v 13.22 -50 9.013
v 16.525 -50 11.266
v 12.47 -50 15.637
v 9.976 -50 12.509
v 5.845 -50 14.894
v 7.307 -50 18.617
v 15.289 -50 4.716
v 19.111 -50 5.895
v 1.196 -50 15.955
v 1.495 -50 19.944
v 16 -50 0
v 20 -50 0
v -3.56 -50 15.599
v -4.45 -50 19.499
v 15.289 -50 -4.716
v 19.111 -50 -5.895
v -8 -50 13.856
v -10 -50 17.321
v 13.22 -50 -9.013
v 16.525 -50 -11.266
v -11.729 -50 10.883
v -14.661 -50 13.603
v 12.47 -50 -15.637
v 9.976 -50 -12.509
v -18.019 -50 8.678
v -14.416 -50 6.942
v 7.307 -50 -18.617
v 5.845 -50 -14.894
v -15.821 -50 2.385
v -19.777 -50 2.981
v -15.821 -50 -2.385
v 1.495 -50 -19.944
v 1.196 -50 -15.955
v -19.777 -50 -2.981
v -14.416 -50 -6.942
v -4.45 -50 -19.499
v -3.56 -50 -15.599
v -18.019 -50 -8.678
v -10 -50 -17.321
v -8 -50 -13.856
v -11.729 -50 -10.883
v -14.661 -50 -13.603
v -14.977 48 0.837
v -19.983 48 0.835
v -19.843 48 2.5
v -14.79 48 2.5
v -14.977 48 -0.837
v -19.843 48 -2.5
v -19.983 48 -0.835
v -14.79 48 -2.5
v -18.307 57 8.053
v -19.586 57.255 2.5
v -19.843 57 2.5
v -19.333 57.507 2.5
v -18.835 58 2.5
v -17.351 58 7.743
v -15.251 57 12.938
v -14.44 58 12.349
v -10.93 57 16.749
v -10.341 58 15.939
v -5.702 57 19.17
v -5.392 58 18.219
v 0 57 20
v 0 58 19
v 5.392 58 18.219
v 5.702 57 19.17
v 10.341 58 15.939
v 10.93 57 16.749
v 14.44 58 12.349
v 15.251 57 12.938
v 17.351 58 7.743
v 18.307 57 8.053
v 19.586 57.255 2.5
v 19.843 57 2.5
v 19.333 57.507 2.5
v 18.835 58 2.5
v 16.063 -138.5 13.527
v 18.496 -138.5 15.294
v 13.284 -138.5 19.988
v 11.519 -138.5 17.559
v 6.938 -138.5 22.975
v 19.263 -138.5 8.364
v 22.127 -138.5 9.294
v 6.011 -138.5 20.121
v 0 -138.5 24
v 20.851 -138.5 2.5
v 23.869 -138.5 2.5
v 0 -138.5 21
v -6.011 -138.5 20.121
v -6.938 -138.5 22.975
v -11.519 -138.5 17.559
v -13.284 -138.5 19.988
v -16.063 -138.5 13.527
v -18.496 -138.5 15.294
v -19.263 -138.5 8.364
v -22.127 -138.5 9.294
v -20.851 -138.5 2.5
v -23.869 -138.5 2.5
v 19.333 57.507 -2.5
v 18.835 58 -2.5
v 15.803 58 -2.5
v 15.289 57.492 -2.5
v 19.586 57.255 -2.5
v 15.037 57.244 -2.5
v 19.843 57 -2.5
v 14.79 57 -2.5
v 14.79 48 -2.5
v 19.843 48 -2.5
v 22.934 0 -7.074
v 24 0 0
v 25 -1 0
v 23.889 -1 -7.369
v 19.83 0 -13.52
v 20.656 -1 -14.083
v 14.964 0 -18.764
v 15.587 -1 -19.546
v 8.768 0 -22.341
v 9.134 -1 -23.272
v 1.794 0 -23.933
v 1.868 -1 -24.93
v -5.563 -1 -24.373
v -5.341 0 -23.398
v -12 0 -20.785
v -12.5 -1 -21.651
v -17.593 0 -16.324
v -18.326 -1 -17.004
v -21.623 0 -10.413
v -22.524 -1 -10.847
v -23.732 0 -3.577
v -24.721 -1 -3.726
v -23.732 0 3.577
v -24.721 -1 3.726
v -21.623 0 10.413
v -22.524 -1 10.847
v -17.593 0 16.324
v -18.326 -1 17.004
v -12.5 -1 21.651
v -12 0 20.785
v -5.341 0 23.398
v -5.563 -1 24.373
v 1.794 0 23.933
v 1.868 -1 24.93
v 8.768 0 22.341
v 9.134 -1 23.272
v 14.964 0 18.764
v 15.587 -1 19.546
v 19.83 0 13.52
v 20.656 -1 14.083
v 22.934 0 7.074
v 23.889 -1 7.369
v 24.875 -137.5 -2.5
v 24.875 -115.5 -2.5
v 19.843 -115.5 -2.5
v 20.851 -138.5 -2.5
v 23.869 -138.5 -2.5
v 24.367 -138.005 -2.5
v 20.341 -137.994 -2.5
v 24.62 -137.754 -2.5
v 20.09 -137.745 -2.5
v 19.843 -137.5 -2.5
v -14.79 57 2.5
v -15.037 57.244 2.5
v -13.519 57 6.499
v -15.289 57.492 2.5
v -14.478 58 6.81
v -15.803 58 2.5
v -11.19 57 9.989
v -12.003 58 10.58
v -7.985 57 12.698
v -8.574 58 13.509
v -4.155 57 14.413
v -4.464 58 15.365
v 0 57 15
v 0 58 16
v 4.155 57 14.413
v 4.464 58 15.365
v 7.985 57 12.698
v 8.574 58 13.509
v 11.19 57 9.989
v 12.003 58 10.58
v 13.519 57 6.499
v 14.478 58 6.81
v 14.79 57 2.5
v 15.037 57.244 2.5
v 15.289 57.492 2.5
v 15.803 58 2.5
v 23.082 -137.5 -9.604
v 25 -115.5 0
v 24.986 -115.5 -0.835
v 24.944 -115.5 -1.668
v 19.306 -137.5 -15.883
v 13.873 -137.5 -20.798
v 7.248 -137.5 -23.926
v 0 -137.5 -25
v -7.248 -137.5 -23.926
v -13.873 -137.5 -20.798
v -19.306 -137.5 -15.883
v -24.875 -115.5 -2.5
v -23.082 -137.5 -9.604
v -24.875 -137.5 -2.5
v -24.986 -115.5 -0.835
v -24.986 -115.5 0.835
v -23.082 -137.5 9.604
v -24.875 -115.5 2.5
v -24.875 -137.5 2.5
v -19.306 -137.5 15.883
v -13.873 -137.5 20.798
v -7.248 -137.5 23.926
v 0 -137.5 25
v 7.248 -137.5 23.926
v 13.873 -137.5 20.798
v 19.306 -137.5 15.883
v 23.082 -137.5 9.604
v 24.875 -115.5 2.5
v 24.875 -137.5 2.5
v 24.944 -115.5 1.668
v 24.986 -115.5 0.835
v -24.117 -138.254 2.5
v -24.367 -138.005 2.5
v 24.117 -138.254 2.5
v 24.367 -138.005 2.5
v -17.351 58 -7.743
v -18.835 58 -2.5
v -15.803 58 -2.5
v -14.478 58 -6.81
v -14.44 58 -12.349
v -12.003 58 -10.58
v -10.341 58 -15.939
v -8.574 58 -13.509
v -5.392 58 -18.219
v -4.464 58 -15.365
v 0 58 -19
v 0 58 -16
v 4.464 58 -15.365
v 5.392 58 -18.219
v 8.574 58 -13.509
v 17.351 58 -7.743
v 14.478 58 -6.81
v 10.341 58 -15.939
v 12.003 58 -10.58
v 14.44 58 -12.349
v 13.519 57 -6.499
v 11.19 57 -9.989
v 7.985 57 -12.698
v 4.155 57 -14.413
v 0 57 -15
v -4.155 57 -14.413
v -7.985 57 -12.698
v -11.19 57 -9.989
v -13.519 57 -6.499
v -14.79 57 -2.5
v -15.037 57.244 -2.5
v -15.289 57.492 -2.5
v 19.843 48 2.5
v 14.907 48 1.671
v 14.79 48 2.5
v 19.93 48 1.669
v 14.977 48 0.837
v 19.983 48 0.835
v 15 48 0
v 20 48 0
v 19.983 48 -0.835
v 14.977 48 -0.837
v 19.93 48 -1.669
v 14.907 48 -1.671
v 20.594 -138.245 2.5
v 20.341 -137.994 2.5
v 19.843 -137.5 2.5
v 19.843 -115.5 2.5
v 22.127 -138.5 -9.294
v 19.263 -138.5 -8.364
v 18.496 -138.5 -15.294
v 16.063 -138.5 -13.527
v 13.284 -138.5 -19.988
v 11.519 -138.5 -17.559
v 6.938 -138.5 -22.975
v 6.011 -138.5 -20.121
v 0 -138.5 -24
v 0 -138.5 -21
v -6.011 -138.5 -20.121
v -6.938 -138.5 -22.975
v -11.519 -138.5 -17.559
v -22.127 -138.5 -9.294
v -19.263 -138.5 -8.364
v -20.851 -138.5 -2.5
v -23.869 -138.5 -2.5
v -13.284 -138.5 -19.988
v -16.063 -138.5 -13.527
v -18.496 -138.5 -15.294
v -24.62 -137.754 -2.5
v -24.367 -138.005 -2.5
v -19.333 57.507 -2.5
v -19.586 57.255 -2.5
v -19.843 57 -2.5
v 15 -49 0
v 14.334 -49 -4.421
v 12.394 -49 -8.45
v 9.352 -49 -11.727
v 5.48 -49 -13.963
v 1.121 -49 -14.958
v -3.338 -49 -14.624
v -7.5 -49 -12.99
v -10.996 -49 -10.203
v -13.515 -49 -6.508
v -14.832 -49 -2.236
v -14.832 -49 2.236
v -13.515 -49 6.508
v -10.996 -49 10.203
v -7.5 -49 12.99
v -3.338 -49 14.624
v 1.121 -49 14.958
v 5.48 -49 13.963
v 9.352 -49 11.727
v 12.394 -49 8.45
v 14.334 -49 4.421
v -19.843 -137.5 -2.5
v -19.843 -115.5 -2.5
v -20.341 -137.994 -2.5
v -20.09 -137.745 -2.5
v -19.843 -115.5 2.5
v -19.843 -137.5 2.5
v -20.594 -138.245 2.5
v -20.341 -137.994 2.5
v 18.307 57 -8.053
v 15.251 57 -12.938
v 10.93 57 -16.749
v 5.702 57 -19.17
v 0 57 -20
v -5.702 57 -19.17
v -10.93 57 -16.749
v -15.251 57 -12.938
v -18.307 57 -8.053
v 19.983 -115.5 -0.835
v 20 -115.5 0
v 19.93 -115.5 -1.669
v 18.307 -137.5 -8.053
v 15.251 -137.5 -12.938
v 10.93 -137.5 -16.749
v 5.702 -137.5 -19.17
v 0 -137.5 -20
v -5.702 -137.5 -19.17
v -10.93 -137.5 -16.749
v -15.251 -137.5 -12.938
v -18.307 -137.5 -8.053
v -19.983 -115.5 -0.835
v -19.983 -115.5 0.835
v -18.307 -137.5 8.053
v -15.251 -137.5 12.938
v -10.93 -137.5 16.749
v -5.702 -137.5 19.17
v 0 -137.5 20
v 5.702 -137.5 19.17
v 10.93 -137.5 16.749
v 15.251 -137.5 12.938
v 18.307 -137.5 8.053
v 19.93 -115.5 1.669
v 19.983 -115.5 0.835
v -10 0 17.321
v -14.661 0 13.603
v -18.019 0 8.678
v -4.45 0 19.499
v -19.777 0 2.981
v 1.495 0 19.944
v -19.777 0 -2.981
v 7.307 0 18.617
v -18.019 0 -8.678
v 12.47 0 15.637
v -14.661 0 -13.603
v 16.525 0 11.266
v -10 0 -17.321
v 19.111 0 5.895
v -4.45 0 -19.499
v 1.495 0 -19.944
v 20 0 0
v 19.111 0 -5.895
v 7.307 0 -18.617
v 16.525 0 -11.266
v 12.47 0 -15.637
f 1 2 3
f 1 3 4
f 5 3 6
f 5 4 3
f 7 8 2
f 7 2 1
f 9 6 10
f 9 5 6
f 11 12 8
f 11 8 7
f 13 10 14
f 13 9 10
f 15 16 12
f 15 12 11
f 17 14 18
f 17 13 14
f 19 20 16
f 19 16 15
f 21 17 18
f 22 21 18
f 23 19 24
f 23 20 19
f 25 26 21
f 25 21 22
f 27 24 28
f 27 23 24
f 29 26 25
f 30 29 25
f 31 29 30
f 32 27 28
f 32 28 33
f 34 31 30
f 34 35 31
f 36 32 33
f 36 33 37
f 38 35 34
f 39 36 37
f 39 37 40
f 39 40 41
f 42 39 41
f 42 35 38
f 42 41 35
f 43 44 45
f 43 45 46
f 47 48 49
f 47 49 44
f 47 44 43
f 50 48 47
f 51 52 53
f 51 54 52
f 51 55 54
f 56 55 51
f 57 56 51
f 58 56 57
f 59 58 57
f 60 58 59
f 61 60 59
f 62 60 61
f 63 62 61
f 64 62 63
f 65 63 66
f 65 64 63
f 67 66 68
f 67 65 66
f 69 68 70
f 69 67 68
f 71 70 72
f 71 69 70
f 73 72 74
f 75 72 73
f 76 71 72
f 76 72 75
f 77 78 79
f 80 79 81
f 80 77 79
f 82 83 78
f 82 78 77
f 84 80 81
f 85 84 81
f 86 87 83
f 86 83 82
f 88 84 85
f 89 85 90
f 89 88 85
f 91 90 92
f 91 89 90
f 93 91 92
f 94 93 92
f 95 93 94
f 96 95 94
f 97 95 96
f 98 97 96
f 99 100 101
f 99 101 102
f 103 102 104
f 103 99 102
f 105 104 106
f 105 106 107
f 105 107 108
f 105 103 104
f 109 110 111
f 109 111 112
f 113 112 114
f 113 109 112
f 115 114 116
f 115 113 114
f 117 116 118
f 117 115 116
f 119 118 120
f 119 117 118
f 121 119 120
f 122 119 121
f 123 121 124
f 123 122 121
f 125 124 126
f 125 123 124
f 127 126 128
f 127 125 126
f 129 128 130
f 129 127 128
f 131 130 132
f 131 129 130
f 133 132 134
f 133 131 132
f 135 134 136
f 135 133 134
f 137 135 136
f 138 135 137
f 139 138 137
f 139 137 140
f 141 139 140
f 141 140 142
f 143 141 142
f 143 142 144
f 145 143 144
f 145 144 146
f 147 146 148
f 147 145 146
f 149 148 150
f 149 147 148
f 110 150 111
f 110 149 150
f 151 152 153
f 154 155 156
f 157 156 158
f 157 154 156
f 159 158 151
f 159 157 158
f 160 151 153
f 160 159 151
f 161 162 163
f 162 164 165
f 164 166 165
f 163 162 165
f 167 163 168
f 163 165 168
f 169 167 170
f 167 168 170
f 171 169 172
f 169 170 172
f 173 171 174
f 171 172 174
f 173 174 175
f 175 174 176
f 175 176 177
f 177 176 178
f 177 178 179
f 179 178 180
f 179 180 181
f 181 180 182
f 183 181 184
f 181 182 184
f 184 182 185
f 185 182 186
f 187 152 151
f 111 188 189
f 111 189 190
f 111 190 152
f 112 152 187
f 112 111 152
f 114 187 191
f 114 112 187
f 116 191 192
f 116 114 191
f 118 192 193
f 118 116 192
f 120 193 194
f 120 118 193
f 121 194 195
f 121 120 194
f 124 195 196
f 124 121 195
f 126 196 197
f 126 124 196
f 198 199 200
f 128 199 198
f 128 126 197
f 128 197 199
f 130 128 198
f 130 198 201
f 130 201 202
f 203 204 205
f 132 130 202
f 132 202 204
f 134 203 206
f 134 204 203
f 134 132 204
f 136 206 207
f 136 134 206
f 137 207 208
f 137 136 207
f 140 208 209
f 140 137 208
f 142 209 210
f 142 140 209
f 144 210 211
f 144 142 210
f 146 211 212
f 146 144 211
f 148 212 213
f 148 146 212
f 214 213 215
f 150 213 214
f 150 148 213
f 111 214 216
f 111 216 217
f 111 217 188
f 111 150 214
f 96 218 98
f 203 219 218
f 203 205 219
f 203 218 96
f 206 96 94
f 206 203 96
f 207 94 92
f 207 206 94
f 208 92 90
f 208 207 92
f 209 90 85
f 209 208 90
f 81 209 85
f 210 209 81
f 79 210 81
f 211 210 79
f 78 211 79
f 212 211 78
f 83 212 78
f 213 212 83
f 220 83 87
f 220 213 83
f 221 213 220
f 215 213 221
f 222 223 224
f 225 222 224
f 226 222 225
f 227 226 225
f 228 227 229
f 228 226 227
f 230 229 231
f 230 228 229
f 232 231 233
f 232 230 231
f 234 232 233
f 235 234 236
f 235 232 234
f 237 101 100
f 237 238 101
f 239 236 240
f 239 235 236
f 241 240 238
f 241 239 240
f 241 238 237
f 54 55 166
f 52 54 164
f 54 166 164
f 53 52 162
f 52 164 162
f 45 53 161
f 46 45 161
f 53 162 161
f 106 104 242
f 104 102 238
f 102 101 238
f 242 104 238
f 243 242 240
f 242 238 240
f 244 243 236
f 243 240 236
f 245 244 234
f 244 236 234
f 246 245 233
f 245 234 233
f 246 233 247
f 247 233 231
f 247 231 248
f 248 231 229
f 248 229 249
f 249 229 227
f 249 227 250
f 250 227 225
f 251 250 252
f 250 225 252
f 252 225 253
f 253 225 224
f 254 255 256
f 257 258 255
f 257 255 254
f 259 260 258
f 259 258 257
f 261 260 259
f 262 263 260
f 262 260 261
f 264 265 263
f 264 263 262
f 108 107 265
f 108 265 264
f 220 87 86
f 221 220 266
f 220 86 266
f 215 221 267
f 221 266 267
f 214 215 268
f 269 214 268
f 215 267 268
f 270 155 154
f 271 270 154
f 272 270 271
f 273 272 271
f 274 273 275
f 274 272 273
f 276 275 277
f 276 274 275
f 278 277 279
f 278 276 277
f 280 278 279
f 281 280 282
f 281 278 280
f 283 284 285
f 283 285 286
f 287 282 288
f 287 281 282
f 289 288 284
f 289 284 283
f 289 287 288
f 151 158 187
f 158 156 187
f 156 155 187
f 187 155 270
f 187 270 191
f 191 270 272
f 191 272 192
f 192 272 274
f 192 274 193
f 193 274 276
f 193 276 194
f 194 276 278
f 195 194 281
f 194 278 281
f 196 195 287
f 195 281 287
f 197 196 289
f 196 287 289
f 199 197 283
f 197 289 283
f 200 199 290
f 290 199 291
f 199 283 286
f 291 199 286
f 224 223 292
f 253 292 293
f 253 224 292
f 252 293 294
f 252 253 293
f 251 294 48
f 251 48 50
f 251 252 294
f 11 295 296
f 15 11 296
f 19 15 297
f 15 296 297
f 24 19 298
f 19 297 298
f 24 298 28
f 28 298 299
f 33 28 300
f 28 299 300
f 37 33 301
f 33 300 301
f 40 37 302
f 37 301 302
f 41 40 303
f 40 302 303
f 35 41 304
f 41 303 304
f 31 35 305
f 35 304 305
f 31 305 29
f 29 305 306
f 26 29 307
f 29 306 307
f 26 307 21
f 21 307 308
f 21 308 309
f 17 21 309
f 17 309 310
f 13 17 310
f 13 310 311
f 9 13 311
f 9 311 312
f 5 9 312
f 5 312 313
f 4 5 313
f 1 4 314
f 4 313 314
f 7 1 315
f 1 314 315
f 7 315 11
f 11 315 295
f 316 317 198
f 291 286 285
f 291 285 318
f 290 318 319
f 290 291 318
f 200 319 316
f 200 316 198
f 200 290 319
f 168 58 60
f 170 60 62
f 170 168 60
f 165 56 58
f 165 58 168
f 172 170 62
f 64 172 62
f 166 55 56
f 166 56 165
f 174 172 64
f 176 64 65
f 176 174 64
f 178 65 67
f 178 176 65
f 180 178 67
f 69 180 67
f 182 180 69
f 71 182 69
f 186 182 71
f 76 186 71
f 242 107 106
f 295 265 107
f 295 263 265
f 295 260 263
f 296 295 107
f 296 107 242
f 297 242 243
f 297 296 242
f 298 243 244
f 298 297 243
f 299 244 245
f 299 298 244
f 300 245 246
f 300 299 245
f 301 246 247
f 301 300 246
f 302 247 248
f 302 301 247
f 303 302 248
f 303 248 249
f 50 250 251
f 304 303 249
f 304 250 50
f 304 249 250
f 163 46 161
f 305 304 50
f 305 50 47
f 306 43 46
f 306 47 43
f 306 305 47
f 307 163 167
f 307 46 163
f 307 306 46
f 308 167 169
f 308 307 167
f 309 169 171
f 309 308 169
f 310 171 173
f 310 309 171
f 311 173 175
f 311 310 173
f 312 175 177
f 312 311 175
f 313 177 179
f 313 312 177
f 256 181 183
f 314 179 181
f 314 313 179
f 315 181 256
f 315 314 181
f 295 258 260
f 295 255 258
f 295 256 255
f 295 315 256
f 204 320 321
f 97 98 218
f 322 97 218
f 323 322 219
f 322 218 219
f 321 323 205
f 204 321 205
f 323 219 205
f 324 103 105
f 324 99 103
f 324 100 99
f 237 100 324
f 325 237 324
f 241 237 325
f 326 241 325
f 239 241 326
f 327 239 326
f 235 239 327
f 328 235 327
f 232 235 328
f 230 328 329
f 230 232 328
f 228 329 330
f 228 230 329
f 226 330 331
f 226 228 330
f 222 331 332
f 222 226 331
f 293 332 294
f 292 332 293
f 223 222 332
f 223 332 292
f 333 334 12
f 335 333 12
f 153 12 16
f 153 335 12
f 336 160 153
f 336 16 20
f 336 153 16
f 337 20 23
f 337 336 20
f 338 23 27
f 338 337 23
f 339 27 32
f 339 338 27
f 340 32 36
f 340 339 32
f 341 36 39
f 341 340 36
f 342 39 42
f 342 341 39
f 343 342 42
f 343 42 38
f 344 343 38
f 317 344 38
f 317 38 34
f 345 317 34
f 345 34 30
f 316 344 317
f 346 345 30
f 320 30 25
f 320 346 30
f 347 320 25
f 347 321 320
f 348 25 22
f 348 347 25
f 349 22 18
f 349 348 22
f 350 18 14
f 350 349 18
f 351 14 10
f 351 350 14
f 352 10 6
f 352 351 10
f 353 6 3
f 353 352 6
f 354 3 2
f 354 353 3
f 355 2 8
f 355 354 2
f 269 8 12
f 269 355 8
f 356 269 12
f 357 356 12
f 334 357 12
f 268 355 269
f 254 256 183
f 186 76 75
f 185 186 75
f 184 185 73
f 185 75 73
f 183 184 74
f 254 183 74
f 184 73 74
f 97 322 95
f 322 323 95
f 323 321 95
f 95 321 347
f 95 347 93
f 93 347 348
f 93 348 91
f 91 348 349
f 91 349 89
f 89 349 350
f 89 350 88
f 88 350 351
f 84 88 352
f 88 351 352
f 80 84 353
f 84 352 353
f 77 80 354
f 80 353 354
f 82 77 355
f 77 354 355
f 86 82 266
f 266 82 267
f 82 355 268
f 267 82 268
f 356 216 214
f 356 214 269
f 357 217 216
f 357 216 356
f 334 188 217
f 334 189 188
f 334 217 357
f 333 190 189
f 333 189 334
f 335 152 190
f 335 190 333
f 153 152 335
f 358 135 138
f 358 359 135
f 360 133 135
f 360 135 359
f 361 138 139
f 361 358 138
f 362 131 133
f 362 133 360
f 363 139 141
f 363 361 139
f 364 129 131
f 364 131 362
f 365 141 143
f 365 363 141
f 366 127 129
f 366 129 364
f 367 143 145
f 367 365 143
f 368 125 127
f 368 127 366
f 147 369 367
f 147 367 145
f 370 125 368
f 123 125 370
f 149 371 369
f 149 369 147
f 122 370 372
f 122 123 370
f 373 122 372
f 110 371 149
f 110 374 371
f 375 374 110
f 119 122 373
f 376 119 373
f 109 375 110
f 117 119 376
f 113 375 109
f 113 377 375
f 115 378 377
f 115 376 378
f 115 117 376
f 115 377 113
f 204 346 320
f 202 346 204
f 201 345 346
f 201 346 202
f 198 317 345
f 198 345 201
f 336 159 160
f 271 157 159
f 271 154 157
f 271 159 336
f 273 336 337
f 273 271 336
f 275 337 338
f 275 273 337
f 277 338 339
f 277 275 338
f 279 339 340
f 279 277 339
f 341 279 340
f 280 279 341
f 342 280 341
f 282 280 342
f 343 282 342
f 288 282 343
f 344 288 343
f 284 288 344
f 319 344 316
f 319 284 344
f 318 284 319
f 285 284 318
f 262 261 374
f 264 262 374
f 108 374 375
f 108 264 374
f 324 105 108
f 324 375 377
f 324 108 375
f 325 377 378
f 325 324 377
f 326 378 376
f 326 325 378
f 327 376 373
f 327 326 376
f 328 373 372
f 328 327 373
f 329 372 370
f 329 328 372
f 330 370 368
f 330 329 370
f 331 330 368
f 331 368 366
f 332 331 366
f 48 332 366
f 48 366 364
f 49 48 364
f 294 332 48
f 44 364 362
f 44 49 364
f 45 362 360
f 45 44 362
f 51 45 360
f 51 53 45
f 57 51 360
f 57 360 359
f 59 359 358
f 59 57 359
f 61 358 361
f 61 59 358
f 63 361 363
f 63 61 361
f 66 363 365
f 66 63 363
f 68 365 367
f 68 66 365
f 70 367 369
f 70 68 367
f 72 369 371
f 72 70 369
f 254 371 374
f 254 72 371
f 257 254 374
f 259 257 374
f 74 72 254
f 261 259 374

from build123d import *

# Parameters (mm, degrees)
SKETCH2_W          = 55
SKETCH2_H          = 5
CUT_EXTRUDE1_DEPTH = 10
SKETCH3_W          = 70
SKETCH3_H          = 5
CUT_EXTRUDE2_DEPTH = 23
CHAMFER1_SIZE      = 1


with BuildPart() as part:
    # Sketch1 → Revolve1 (revolve)
    with BuildSketch(Plane.XY):
        Polygon((20, -138.5), (25, -138.5), (25, 0), (20, 0), (20, 58), (15, 58), (15, -50), (20, -50), align=None)
    revolve(axis=Axis((0, 0, 0), (0, 1, 0)))

    # Sketch2 → Cut-Extrude1 (cut)
    with BuildSketch(Plane(origin=(0, 58, 0), x_dir=(1, 0, 0), z_dir=(0, 1, 0))):
        Rectangle(SKETCH2_W, SKETCH2_H)
    extrude(amount=-CUT_EXTRUDE1_DEPTH, mode=Mode.SUBTRACT)

    # Sketch3 → Cut-Extrude2 (cut)
    with BuildSketch(Plane(origin=(0, -138.5, 0), x_dir=(-1, 0, 0), z_dir=(0, -1, 0))):
        Rectangle(SKETCH3_W, SKETCH3_H)
    extrude(amount=-CUT_EXTRUDE2_DEPTH, mode=Mode.SUBTRACT)

    # Chamfer1
    chamfer1_edges = [part.edges().sort_by_distance(p)[0] for p in [
        (0, 58, 15),
        (0, 58, -15),
        (0, 58, 20),
        (0, 58, -20),
        (0, -138.5, 25),
        (0, -138.5, -25),
        (0, -138.5, 20),
        (0, -138.5, -20),
        (-15, -50, 0),
        (-25, 0, 0),
    ]]
    chamfer(chamfer1_edges, length=CHAMFER1_SIZE)


solid = part.part
